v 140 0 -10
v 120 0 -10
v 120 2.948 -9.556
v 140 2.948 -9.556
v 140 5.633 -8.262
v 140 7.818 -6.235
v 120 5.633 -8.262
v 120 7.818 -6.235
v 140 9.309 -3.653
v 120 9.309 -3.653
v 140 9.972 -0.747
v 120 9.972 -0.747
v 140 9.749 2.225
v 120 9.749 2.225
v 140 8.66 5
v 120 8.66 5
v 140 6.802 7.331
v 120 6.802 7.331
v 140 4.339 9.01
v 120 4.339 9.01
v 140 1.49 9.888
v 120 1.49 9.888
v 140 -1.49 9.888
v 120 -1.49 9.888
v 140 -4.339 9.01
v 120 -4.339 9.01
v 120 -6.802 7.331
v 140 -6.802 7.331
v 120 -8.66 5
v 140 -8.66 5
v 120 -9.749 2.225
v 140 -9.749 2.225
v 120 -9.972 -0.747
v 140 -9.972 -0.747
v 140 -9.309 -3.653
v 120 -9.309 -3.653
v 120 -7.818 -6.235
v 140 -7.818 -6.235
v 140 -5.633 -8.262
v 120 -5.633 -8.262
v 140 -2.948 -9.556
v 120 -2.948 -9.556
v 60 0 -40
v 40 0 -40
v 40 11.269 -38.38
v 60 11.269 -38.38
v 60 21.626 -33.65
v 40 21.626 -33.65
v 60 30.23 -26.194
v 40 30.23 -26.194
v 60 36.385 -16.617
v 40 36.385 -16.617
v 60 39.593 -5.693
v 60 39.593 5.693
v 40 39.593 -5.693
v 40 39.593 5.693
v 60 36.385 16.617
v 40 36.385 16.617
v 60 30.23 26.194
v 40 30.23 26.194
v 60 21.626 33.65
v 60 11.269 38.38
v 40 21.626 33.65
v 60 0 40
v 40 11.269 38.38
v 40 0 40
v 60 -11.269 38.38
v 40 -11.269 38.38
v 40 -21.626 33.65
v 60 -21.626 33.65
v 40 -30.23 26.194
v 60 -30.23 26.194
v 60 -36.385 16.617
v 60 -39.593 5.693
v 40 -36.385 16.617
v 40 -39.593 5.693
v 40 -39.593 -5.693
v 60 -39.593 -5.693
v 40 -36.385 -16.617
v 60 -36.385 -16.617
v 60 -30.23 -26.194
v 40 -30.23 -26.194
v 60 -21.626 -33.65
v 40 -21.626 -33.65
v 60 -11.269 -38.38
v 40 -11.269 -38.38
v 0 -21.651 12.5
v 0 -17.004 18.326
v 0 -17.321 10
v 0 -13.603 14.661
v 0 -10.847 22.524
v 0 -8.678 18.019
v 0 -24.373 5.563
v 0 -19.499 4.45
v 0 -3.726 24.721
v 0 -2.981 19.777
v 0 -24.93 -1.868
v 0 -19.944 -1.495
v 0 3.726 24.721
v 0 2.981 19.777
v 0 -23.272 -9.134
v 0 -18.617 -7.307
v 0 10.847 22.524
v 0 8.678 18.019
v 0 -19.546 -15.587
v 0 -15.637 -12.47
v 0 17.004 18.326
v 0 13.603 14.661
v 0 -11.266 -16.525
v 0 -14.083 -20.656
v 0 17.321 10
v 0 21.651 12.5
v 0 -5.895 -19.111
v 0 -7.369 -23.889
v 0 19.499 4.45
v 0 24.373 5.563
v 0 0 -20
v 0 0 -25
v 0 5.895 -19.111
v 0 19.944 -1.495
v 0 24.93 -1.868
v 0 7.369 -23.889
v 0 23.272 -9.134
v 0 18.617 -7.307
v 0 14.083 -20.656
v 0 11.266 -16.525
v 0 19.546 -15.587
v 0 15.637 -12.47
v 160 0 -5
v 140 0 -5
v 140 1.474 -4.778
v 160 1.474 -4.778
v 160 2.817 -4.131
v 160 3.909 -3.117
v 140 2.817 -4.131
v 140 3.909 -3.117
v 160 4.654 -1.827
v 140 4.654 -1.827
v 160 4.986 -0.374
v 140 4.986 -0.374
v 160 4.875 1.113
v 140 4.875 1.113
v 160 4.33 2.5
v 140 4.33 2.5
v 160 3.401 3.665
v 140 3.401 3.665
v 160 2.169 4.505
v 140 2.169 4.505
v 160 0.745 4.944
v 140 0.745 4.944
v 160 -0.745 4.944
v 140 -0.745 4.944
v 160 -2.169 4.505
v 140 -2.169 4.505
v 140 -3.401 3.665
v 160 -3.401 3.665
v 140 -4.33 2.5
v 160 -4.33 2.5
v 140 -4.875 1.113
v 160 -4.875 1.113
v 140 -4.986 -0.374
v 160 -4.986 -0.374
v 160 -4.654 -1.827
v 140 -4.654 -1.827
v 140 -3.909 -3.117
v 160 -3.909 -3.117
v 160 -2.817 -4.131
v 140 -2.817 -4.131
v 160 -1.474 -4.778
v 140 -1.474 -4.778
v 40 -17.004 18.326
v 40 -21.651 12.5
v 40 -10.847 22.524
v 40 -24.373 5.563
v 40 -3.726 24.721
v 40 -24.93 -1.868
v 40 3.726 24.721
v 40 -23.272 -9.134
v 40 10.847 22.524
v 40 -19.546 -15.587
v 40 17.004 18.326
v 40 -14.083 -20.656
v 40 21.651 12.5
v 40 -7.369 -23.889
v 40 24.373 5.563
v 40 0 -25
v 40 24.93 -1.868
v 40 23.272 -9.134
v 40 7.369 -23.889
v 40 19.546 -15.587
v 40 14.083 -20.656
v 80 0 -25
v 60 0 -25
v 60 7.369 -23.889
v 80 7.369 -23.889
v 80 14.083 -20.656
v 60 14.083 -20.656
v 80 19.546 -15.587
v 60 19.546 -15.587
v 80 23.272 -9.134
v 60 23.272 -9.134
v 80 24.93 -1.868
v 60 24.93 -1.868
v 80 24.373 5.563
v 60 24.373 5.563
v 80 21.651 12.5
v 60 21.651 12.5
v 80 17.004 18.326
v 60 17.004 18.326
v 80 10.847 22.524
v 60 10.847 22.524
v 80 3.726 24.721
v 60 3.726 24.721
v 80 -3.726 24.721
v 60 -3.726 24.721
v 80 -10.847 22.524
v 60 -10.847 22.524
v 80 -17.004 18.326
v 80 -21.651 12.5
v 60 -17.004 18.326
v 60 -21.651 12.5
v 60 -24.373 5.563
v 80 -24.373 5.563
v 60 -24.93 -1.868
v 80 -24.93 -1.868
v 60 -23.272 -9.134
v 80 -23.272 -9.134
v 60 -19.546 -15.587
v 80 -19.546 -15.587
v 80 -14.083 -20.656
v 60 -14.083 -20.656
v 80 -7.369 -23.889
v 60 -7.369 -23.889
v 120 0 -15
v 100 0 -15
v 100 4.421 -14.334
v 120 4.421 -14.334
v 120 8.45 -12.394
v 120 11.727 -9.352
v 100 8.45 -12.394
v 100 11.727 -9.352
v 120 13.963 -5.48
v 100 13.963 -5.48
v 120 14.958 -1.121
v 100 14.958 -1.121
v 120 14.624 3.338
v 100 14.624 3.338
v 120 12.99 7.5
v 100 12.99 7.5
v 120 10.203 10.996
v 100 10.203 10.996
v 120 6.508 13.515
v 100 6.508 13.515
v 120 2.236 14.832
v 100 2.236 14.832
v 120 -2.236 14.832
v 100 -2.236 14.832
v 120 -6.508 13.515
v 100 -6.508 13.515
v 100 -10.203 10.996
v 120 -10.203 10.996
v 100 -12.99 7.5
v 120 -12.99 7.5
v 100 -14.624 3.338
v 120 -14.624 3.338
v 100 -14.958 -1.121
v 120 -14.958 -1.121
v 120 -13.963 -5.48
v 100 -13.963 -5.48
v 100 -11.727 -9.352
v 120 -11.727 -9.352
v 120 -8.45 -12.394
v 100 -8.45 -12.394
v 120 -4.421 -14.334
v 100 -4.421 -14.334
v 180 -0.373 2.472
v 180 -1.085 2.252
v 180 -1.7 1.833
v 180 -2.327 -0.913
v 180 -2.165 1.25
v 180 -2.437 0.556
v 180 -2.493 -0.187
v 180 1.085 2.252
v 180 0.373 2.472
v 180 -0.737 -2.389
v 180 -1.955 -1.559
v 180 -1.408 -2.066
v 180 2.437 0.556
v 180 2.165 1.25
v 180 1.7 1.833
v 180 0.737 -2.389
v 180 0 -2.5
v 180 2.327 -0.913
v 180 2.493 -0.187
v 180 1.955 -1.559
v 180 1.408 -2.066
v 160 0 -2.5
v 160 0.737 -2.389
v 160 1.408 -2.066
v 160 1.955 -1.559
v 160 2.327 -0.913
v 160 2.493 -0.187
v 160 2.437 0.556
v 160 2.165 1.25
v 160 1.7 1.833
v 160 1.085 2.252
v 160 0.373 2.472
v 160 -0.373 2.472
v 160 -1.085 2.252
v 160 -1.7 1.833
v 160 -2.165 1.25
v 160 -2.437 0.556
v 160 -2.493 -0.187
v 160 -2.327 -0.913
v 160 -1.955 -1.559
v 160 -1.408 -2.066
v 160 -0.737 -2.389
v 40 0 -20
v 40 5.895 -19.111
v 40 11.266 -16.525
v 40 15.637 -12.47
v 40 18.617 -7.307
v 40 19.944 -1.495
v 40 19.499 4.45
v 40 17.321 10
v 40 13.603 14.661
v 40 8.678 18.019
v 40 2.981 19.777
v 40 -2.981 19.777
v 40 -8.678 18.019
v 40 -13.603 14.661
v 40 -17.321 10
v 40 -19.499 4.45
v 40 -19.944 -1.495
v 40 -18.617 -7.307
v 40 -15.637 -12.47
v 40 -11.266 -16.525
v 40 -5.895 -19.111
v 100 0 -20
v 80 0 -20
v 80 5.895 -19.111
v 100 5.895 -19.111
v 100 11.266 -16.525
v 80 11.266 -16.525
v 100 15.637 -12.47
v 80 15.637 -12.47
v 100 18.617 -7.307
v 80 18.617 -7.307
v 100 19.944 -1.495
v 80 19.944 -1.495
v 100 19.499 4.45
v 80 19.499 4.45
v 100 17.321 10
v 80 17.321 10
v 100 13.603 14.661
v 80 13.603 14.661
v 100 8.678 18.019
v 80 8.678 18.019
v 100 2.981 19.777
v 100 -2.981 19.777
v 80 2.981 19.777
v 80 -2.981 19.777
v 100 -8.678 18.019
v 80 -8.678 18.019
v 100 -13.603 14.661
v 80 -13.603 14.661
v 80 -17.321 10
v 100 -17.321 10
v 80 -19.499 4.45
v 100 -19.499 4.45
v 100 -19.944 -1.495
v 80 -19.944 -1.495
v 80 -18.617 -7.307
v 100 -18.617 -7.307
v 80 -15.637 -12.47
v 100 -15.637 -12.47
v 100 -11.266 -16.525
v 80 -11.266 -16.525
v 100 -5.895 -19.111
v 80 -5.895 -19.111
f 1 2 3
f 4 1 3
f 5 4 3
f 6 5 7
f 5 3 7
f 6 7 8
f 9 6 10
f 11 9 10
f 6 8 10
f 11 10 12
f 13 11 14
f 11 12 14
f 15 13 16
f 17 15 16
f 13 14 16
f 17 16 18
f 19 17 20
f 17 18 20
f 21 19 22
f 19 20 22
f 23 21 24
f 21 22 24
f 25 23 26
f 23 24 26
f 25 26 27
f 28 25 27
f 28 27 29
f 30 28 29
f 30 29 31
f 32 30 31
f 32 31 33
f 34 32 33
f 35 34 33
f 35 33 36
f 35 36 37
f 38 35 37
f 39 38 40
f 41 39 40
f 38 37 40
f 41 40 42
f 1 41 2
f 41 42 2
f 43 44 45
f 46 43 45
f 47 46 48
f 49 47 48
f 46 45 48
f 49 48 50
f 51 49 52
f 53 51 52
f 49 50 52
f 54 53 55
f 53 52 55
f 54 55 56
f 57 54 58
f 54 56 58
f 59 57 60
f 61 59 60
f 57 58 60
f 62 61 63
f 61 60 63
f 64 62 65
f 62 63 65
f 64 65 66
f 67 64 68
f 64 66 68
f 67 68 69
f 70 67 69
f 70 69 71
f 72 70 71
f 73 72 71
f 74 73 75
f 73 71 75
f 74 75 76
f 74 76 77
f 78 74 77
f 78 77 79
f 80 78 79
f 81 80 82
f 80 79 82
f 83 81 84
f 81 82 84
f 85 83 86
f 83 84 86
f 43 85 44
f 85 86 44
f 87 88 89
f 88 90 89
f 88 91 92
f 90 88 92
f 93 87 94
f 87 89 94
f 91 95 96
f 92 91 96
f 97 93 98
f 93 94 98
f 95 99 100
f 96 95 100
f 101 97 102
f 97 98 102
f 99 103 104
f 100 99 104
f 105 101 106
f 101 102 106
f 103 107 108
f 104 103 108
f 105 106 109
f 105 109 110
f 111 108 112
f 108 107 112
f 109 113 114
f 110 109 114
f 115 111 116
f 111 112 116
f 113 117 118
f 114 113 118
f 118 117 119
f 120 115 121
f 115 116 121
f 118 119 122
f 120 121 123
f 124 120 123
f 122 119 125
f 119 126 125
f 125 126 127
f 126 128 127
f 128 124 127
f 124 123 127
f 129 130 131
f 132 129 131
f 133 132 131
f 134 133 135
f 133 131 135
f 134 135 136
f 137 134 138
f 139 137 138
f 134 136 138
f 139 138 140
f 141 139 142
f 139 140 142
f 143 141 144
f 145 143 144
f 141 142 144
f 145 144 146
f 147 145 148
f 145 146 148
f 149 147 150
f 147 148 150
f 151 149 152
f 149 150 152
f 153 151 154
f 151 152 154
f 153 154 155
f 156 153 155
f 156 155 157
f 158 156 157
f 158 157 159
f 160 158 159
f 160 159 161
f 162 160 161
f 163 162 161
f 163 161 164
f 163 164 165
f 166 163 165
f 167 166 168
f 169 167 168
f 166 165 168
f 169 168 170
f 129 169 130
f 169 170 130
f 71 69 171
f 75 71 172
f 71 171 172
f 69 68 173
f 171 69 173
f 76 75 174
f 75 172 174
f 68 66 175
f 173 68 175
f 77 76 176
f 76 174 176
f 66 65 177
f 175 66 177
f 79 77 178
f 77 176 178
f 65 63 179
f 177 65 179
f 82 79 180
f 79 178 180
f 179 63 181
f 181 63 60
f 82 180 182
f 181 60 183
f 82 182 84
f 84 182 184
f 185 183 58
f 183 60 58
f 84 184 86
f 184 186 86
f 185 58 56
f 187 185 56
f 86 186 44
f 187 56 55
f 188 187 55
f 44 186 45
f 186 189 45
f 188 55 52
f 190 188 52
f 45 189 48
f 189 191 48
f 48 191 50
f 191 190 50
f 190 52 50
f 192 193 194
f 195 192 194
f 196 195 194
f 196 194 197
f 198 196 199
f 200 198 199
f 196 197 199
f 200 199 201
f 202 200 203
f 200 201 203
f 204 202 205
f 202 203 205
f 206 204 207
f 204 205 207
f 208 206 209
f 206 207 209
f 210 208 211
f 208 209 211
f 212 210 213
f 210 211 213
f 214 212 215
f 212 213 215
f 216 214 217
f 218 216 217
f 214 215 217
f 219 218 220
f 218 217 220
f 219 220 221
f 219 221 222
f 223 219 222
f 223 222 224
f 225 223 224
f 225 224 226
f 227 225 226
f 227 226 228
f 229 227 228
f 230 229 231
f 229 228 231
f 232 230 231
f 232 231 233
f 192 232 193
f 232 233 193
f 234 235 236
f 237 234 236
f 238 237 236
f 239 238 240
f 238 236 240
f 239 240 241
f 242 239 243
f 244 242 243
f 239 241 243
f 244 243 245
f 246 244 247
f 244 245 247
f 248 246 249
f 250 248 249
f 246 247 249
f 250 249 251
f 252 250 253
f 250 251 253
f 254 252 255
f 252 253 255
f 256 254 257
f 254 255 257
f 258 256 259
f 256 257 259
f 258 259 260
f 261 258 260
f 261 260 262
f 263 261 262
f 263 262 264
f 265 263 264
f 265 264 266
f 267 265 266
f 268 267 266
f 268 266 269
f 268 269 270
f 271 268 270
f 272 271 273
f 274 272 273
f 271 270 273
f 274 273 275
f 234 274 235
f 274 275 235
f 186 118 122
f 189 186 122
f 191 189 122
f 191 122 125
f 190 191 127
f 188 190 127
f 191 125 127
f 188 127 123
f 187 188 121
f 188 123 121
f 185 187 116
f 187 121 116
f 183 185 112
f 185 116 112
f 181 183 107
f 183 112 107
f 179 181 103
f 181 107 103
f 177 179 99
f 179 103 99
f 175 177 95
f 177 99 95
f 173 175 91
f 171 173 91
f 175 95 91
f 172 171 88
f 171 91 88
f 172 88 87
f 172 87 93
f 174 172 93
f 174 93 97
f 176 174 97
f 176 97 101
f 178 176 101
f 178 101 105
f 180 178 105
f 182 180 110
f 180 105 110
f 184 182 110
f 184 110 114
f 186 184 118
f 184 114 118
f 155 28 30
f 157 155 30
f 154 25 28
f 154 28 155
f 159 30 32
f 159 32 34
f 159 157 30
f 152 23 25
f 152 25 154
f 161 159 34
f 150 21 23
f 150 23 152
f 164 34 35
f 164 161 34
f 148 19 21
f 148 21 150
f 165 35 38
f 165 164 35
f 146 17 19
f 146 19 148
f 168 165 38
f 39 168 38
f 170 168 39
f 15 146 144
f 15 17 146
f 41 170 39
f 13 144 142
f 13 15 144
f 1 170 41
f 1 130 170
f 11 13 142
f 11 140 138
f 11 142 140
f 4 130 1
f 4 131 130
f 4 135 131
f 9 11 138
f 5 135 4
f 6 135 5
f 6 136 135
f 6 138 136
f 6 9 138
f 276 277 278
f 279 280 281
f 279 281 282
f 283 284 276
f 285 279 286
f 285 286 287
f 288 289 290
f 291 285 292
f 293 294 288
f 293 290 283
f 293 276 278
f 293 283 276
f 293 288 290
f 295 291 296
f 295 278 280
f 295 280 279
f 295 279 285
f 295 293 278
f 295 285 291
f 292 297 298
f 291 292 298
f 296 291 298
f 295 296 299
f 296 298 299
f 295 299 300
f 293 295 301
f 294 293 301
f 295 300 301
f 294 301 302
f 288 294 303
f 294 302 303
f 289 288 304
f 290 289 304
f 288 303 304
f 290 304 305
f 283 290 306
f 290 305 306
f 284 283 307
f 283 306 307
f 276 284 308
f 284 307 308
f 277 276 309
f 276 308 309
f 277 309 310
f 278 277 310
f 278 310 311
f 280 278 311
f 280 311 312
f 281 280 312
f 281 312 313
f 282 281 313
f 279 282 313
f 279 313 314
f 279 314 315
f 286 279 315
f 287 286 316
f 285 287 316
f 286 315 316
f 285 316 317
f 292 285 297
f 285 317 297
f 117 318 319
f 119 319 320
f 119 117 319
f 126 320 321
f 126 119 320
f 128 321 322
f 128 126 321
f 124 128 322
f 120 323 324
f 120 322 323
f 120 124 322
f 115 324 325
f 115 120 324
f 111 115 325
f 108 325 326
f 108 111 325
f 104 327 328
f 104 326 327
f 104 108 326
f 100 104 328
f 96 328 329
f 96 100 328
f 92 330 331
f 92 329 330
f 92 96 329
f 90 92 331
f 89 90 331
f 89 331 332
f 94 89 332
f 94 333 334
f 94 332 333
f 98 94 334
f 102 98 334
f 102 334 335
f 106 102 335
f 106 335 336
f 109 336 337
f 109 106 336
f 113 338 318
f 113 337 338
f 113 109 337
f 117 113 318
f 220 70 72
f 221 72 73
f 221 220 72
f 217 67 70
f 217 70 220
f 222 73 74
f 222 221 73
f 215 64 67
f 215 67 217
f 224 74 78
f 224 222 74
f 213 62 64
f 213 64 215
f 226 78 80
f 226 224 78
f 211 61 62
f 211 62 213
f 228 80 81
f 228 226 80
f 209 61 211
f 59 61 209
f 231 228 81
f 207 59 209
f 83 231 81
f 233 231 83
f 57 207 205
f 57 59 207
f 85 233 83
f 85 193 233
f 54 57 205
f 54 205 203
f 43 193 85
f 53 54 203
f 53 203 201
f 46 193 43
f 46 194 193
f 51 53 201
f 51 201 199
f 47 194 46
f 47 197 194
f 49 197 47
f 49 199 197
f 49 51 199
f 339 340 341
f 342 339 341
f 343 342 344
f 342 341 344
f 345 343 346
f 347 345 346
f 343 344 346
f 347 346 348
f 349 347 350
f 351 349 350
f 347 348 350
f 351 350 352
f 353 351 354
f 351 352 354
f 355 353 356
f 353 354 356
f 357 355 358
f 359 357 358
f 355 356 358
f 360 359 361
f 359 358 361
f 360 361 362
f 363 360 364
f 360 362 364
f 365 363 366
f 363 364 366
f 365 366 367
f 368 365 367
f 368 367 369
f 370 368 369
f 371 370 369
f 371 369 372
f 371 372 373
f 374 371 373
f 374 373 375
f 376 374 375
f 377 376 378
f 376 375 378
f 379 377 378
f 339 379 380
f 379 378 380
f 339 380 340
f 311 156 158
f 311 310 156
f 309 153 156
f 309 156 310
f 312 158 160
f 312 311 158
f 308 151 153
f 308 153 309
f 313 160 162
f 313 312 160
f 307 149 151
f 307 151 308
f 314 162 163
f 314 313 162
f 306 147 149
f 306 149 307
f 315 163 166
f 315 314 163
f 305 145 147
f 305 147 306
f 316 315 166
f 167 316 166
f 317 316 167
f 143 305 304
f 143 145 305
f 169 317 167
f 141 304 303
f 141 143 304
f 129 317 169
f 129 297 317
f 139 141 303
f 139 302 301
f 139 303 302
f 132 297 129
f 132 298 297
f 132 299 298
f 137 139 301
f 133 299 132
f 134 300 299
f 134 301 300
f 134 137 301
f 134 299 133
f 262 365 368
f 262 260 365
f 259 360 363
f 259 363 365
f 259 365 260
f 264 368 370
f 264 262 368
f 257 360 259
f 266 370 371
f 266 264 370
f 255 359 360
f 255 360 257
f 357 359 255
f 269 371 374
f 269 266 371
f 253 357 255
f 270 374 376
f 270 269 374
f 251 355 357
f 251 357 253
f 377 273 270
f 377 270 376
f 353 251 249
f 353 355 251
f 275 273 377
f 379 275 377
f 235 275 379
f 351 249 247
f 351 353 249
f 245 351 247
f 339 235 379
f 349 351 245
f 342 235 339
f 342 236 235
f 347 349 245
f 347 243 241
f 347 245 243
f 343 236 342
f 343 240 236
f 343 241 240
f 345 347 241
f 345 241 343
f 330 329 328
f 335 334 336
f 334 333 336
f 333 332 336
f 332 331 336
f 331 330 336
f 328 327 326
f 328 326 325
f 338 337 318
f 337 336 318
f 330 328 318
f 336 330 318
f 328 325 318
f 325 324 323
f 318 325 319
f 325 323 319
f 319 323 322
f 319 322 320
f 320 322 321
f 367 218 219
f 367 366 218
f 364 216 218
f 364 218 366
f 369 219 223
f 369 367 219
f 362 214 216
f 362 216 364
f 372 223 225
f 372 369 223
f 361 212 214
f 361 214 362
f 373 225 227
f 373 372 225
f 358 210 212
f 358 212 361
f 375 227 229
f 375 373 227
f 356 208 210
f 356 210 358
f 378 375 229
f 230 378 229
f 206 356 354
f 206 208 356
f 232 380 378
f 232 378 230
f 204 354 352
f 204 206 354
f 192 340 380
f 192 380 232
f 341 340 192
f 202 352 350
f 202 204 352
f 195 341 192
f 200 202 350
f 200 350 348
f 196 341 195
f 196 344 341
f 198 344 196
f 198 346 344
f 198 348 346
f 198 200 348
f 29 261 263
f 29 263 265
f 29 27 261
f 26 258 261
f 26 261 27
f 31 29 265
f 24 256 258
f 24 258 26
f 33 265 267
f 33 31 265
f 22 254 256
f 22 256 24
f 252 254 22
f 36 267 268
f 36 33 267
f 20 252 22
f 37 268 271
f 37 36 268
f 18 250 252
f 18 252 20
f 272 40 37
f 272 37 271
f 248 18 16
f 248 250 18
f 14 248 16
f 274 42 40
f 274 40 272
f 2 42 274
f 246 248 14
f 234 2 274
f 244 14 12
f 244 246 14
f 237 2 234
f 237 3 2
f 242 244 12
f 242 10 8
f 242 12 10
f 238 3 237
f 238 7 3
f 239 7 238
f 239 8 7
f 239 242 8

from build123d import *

# Parameters (mm, degrees)
SKETCH1_R           = 25
BOSS_EXTRUDE1_DEPTH = 40
SKETCH2_R           = 20
CUT_EXTRUDE1_DEPTH  = 70
SKETCH9_R           = 2.5
BOSS_EXTRUDE2_DEPTH = 20
SKETCH3_R           = 40
BOSS_EXTRUDE3_DEPTH = 20
SKETCH4_R           = 25
BOSS_EXTRUDE4_DEPTH = 20
SKETCH5_R           = 20
BOSS_EXTRUDE5_DEPTH = 20
SKETCH6_R           = 15
BOSS_EXTRUDE6_DEPTH = 20
SKETCH7_R           = 10
BOSS_EXTRUDE7_DEPTH = 20
SKETCH8_R           = 5
BOSS_EXTRUDE8_DEPTH = 20


with BuildPart() as part:
    # Sketch1 → Boss-Extrude1 (new body)
    with BuildSketch(Plane(origin=(0, 0, 0), x_dir=(0, 0, -1), z_dir=(1, 0, 0))):
        Circle(SKETCH1_R)
    extrude(amount=BOSS_EXTRUDE1_DEPTH)

    # Sketch2 → Cut-Extrude1 (cut)
    with BuildSketch(Plane(origin=(0, 0, 0), x_dir=(0, 0, -1), z_dir=(1, 0, 0))):
        Circle(SKETCH2_R)
    extrude(amount=CUT_EXTRUDE1_DEPTH, mode=Mode.SUBTRACT)

    # Sketch3 → Boss-Extrude3 (add)
    with BuildSketch(Plane(origin=(40, 0, 0), x_dir=(0, 0, -1), z_dir=(1, 0, 0))):
        Circle(SKETCH3_R)
    extrude(amount=BOSS_EXTRUDE3_DEPTH)

    # Sketch4 → Boss-Extrude4 (add)
    with BuildSketch(Plane(origin=(60, 0, 0), x_dir=(0, 0, -1), z_dir=(1, 0, 0))):
        Circle(SKETCH4_R)
    extrude(amount=BOSS_EXTRUDE4_DEPTH)

    # Sketch5 → Boss-Extrude5 (add)
    with BuildSketch(Plane(origin=(80, 0, 0), x_dir=(0, 0, -1), z_dir=(1, 0, 0))):
        Circle(SKETCH5_R)
    extrude(amount=BOSS_EXTRUDE5_DEPTH)

    # Sketch6 → Boss-Extrude6 (add)
    with BuildSketch(Plane(origin=(100, 0, 0), x_dir=(0, 0, -1), z_dir=(1, 0, 0))):
        Circle(SKETCH6_R)
    extrude(amount=BOSS_EXTRUDE6_DEPTH)

    # Sketch7 → Boss-Extrude7 (add)
    with BuildSketch(Plane(origin=(120, 0, 0), x_dir=(0, 0, -1), z_dir=(1, 0, 0))):
        Circle(SKETCH7_R)
    extrude(amount=BOSS_EXTRUDE7_DEPTH)



with BuildPart() as body_2:
    # Sketch9 → Boss-Extrude2 (new body)
    with BuildSketch(Plane(origin=(160, 0, 0), x_dir=(0, 0, -1), z_dir=(1, 0, 0))):
        Circle(SKETCH9_R)
    extrude(amount=BOSS_EXTRUDE2_DEPTH)


with BuildPart() as part_1:
    add(part.part)

    add(body_2.part)  # Boss-Extrude8 merges body 2
    # Sketch8 → Boss-Extrude8 (add)
    with BuildSketch(Plane(origin=(140, 0, 0), x_dir=(0, 0, -1), z_dir=(1, 0, 0))):
        Circle(SKETCH8_R)
    extrude(amount=BOSS_EXTRUDE8_DEPTH)


solid = part_1.part
